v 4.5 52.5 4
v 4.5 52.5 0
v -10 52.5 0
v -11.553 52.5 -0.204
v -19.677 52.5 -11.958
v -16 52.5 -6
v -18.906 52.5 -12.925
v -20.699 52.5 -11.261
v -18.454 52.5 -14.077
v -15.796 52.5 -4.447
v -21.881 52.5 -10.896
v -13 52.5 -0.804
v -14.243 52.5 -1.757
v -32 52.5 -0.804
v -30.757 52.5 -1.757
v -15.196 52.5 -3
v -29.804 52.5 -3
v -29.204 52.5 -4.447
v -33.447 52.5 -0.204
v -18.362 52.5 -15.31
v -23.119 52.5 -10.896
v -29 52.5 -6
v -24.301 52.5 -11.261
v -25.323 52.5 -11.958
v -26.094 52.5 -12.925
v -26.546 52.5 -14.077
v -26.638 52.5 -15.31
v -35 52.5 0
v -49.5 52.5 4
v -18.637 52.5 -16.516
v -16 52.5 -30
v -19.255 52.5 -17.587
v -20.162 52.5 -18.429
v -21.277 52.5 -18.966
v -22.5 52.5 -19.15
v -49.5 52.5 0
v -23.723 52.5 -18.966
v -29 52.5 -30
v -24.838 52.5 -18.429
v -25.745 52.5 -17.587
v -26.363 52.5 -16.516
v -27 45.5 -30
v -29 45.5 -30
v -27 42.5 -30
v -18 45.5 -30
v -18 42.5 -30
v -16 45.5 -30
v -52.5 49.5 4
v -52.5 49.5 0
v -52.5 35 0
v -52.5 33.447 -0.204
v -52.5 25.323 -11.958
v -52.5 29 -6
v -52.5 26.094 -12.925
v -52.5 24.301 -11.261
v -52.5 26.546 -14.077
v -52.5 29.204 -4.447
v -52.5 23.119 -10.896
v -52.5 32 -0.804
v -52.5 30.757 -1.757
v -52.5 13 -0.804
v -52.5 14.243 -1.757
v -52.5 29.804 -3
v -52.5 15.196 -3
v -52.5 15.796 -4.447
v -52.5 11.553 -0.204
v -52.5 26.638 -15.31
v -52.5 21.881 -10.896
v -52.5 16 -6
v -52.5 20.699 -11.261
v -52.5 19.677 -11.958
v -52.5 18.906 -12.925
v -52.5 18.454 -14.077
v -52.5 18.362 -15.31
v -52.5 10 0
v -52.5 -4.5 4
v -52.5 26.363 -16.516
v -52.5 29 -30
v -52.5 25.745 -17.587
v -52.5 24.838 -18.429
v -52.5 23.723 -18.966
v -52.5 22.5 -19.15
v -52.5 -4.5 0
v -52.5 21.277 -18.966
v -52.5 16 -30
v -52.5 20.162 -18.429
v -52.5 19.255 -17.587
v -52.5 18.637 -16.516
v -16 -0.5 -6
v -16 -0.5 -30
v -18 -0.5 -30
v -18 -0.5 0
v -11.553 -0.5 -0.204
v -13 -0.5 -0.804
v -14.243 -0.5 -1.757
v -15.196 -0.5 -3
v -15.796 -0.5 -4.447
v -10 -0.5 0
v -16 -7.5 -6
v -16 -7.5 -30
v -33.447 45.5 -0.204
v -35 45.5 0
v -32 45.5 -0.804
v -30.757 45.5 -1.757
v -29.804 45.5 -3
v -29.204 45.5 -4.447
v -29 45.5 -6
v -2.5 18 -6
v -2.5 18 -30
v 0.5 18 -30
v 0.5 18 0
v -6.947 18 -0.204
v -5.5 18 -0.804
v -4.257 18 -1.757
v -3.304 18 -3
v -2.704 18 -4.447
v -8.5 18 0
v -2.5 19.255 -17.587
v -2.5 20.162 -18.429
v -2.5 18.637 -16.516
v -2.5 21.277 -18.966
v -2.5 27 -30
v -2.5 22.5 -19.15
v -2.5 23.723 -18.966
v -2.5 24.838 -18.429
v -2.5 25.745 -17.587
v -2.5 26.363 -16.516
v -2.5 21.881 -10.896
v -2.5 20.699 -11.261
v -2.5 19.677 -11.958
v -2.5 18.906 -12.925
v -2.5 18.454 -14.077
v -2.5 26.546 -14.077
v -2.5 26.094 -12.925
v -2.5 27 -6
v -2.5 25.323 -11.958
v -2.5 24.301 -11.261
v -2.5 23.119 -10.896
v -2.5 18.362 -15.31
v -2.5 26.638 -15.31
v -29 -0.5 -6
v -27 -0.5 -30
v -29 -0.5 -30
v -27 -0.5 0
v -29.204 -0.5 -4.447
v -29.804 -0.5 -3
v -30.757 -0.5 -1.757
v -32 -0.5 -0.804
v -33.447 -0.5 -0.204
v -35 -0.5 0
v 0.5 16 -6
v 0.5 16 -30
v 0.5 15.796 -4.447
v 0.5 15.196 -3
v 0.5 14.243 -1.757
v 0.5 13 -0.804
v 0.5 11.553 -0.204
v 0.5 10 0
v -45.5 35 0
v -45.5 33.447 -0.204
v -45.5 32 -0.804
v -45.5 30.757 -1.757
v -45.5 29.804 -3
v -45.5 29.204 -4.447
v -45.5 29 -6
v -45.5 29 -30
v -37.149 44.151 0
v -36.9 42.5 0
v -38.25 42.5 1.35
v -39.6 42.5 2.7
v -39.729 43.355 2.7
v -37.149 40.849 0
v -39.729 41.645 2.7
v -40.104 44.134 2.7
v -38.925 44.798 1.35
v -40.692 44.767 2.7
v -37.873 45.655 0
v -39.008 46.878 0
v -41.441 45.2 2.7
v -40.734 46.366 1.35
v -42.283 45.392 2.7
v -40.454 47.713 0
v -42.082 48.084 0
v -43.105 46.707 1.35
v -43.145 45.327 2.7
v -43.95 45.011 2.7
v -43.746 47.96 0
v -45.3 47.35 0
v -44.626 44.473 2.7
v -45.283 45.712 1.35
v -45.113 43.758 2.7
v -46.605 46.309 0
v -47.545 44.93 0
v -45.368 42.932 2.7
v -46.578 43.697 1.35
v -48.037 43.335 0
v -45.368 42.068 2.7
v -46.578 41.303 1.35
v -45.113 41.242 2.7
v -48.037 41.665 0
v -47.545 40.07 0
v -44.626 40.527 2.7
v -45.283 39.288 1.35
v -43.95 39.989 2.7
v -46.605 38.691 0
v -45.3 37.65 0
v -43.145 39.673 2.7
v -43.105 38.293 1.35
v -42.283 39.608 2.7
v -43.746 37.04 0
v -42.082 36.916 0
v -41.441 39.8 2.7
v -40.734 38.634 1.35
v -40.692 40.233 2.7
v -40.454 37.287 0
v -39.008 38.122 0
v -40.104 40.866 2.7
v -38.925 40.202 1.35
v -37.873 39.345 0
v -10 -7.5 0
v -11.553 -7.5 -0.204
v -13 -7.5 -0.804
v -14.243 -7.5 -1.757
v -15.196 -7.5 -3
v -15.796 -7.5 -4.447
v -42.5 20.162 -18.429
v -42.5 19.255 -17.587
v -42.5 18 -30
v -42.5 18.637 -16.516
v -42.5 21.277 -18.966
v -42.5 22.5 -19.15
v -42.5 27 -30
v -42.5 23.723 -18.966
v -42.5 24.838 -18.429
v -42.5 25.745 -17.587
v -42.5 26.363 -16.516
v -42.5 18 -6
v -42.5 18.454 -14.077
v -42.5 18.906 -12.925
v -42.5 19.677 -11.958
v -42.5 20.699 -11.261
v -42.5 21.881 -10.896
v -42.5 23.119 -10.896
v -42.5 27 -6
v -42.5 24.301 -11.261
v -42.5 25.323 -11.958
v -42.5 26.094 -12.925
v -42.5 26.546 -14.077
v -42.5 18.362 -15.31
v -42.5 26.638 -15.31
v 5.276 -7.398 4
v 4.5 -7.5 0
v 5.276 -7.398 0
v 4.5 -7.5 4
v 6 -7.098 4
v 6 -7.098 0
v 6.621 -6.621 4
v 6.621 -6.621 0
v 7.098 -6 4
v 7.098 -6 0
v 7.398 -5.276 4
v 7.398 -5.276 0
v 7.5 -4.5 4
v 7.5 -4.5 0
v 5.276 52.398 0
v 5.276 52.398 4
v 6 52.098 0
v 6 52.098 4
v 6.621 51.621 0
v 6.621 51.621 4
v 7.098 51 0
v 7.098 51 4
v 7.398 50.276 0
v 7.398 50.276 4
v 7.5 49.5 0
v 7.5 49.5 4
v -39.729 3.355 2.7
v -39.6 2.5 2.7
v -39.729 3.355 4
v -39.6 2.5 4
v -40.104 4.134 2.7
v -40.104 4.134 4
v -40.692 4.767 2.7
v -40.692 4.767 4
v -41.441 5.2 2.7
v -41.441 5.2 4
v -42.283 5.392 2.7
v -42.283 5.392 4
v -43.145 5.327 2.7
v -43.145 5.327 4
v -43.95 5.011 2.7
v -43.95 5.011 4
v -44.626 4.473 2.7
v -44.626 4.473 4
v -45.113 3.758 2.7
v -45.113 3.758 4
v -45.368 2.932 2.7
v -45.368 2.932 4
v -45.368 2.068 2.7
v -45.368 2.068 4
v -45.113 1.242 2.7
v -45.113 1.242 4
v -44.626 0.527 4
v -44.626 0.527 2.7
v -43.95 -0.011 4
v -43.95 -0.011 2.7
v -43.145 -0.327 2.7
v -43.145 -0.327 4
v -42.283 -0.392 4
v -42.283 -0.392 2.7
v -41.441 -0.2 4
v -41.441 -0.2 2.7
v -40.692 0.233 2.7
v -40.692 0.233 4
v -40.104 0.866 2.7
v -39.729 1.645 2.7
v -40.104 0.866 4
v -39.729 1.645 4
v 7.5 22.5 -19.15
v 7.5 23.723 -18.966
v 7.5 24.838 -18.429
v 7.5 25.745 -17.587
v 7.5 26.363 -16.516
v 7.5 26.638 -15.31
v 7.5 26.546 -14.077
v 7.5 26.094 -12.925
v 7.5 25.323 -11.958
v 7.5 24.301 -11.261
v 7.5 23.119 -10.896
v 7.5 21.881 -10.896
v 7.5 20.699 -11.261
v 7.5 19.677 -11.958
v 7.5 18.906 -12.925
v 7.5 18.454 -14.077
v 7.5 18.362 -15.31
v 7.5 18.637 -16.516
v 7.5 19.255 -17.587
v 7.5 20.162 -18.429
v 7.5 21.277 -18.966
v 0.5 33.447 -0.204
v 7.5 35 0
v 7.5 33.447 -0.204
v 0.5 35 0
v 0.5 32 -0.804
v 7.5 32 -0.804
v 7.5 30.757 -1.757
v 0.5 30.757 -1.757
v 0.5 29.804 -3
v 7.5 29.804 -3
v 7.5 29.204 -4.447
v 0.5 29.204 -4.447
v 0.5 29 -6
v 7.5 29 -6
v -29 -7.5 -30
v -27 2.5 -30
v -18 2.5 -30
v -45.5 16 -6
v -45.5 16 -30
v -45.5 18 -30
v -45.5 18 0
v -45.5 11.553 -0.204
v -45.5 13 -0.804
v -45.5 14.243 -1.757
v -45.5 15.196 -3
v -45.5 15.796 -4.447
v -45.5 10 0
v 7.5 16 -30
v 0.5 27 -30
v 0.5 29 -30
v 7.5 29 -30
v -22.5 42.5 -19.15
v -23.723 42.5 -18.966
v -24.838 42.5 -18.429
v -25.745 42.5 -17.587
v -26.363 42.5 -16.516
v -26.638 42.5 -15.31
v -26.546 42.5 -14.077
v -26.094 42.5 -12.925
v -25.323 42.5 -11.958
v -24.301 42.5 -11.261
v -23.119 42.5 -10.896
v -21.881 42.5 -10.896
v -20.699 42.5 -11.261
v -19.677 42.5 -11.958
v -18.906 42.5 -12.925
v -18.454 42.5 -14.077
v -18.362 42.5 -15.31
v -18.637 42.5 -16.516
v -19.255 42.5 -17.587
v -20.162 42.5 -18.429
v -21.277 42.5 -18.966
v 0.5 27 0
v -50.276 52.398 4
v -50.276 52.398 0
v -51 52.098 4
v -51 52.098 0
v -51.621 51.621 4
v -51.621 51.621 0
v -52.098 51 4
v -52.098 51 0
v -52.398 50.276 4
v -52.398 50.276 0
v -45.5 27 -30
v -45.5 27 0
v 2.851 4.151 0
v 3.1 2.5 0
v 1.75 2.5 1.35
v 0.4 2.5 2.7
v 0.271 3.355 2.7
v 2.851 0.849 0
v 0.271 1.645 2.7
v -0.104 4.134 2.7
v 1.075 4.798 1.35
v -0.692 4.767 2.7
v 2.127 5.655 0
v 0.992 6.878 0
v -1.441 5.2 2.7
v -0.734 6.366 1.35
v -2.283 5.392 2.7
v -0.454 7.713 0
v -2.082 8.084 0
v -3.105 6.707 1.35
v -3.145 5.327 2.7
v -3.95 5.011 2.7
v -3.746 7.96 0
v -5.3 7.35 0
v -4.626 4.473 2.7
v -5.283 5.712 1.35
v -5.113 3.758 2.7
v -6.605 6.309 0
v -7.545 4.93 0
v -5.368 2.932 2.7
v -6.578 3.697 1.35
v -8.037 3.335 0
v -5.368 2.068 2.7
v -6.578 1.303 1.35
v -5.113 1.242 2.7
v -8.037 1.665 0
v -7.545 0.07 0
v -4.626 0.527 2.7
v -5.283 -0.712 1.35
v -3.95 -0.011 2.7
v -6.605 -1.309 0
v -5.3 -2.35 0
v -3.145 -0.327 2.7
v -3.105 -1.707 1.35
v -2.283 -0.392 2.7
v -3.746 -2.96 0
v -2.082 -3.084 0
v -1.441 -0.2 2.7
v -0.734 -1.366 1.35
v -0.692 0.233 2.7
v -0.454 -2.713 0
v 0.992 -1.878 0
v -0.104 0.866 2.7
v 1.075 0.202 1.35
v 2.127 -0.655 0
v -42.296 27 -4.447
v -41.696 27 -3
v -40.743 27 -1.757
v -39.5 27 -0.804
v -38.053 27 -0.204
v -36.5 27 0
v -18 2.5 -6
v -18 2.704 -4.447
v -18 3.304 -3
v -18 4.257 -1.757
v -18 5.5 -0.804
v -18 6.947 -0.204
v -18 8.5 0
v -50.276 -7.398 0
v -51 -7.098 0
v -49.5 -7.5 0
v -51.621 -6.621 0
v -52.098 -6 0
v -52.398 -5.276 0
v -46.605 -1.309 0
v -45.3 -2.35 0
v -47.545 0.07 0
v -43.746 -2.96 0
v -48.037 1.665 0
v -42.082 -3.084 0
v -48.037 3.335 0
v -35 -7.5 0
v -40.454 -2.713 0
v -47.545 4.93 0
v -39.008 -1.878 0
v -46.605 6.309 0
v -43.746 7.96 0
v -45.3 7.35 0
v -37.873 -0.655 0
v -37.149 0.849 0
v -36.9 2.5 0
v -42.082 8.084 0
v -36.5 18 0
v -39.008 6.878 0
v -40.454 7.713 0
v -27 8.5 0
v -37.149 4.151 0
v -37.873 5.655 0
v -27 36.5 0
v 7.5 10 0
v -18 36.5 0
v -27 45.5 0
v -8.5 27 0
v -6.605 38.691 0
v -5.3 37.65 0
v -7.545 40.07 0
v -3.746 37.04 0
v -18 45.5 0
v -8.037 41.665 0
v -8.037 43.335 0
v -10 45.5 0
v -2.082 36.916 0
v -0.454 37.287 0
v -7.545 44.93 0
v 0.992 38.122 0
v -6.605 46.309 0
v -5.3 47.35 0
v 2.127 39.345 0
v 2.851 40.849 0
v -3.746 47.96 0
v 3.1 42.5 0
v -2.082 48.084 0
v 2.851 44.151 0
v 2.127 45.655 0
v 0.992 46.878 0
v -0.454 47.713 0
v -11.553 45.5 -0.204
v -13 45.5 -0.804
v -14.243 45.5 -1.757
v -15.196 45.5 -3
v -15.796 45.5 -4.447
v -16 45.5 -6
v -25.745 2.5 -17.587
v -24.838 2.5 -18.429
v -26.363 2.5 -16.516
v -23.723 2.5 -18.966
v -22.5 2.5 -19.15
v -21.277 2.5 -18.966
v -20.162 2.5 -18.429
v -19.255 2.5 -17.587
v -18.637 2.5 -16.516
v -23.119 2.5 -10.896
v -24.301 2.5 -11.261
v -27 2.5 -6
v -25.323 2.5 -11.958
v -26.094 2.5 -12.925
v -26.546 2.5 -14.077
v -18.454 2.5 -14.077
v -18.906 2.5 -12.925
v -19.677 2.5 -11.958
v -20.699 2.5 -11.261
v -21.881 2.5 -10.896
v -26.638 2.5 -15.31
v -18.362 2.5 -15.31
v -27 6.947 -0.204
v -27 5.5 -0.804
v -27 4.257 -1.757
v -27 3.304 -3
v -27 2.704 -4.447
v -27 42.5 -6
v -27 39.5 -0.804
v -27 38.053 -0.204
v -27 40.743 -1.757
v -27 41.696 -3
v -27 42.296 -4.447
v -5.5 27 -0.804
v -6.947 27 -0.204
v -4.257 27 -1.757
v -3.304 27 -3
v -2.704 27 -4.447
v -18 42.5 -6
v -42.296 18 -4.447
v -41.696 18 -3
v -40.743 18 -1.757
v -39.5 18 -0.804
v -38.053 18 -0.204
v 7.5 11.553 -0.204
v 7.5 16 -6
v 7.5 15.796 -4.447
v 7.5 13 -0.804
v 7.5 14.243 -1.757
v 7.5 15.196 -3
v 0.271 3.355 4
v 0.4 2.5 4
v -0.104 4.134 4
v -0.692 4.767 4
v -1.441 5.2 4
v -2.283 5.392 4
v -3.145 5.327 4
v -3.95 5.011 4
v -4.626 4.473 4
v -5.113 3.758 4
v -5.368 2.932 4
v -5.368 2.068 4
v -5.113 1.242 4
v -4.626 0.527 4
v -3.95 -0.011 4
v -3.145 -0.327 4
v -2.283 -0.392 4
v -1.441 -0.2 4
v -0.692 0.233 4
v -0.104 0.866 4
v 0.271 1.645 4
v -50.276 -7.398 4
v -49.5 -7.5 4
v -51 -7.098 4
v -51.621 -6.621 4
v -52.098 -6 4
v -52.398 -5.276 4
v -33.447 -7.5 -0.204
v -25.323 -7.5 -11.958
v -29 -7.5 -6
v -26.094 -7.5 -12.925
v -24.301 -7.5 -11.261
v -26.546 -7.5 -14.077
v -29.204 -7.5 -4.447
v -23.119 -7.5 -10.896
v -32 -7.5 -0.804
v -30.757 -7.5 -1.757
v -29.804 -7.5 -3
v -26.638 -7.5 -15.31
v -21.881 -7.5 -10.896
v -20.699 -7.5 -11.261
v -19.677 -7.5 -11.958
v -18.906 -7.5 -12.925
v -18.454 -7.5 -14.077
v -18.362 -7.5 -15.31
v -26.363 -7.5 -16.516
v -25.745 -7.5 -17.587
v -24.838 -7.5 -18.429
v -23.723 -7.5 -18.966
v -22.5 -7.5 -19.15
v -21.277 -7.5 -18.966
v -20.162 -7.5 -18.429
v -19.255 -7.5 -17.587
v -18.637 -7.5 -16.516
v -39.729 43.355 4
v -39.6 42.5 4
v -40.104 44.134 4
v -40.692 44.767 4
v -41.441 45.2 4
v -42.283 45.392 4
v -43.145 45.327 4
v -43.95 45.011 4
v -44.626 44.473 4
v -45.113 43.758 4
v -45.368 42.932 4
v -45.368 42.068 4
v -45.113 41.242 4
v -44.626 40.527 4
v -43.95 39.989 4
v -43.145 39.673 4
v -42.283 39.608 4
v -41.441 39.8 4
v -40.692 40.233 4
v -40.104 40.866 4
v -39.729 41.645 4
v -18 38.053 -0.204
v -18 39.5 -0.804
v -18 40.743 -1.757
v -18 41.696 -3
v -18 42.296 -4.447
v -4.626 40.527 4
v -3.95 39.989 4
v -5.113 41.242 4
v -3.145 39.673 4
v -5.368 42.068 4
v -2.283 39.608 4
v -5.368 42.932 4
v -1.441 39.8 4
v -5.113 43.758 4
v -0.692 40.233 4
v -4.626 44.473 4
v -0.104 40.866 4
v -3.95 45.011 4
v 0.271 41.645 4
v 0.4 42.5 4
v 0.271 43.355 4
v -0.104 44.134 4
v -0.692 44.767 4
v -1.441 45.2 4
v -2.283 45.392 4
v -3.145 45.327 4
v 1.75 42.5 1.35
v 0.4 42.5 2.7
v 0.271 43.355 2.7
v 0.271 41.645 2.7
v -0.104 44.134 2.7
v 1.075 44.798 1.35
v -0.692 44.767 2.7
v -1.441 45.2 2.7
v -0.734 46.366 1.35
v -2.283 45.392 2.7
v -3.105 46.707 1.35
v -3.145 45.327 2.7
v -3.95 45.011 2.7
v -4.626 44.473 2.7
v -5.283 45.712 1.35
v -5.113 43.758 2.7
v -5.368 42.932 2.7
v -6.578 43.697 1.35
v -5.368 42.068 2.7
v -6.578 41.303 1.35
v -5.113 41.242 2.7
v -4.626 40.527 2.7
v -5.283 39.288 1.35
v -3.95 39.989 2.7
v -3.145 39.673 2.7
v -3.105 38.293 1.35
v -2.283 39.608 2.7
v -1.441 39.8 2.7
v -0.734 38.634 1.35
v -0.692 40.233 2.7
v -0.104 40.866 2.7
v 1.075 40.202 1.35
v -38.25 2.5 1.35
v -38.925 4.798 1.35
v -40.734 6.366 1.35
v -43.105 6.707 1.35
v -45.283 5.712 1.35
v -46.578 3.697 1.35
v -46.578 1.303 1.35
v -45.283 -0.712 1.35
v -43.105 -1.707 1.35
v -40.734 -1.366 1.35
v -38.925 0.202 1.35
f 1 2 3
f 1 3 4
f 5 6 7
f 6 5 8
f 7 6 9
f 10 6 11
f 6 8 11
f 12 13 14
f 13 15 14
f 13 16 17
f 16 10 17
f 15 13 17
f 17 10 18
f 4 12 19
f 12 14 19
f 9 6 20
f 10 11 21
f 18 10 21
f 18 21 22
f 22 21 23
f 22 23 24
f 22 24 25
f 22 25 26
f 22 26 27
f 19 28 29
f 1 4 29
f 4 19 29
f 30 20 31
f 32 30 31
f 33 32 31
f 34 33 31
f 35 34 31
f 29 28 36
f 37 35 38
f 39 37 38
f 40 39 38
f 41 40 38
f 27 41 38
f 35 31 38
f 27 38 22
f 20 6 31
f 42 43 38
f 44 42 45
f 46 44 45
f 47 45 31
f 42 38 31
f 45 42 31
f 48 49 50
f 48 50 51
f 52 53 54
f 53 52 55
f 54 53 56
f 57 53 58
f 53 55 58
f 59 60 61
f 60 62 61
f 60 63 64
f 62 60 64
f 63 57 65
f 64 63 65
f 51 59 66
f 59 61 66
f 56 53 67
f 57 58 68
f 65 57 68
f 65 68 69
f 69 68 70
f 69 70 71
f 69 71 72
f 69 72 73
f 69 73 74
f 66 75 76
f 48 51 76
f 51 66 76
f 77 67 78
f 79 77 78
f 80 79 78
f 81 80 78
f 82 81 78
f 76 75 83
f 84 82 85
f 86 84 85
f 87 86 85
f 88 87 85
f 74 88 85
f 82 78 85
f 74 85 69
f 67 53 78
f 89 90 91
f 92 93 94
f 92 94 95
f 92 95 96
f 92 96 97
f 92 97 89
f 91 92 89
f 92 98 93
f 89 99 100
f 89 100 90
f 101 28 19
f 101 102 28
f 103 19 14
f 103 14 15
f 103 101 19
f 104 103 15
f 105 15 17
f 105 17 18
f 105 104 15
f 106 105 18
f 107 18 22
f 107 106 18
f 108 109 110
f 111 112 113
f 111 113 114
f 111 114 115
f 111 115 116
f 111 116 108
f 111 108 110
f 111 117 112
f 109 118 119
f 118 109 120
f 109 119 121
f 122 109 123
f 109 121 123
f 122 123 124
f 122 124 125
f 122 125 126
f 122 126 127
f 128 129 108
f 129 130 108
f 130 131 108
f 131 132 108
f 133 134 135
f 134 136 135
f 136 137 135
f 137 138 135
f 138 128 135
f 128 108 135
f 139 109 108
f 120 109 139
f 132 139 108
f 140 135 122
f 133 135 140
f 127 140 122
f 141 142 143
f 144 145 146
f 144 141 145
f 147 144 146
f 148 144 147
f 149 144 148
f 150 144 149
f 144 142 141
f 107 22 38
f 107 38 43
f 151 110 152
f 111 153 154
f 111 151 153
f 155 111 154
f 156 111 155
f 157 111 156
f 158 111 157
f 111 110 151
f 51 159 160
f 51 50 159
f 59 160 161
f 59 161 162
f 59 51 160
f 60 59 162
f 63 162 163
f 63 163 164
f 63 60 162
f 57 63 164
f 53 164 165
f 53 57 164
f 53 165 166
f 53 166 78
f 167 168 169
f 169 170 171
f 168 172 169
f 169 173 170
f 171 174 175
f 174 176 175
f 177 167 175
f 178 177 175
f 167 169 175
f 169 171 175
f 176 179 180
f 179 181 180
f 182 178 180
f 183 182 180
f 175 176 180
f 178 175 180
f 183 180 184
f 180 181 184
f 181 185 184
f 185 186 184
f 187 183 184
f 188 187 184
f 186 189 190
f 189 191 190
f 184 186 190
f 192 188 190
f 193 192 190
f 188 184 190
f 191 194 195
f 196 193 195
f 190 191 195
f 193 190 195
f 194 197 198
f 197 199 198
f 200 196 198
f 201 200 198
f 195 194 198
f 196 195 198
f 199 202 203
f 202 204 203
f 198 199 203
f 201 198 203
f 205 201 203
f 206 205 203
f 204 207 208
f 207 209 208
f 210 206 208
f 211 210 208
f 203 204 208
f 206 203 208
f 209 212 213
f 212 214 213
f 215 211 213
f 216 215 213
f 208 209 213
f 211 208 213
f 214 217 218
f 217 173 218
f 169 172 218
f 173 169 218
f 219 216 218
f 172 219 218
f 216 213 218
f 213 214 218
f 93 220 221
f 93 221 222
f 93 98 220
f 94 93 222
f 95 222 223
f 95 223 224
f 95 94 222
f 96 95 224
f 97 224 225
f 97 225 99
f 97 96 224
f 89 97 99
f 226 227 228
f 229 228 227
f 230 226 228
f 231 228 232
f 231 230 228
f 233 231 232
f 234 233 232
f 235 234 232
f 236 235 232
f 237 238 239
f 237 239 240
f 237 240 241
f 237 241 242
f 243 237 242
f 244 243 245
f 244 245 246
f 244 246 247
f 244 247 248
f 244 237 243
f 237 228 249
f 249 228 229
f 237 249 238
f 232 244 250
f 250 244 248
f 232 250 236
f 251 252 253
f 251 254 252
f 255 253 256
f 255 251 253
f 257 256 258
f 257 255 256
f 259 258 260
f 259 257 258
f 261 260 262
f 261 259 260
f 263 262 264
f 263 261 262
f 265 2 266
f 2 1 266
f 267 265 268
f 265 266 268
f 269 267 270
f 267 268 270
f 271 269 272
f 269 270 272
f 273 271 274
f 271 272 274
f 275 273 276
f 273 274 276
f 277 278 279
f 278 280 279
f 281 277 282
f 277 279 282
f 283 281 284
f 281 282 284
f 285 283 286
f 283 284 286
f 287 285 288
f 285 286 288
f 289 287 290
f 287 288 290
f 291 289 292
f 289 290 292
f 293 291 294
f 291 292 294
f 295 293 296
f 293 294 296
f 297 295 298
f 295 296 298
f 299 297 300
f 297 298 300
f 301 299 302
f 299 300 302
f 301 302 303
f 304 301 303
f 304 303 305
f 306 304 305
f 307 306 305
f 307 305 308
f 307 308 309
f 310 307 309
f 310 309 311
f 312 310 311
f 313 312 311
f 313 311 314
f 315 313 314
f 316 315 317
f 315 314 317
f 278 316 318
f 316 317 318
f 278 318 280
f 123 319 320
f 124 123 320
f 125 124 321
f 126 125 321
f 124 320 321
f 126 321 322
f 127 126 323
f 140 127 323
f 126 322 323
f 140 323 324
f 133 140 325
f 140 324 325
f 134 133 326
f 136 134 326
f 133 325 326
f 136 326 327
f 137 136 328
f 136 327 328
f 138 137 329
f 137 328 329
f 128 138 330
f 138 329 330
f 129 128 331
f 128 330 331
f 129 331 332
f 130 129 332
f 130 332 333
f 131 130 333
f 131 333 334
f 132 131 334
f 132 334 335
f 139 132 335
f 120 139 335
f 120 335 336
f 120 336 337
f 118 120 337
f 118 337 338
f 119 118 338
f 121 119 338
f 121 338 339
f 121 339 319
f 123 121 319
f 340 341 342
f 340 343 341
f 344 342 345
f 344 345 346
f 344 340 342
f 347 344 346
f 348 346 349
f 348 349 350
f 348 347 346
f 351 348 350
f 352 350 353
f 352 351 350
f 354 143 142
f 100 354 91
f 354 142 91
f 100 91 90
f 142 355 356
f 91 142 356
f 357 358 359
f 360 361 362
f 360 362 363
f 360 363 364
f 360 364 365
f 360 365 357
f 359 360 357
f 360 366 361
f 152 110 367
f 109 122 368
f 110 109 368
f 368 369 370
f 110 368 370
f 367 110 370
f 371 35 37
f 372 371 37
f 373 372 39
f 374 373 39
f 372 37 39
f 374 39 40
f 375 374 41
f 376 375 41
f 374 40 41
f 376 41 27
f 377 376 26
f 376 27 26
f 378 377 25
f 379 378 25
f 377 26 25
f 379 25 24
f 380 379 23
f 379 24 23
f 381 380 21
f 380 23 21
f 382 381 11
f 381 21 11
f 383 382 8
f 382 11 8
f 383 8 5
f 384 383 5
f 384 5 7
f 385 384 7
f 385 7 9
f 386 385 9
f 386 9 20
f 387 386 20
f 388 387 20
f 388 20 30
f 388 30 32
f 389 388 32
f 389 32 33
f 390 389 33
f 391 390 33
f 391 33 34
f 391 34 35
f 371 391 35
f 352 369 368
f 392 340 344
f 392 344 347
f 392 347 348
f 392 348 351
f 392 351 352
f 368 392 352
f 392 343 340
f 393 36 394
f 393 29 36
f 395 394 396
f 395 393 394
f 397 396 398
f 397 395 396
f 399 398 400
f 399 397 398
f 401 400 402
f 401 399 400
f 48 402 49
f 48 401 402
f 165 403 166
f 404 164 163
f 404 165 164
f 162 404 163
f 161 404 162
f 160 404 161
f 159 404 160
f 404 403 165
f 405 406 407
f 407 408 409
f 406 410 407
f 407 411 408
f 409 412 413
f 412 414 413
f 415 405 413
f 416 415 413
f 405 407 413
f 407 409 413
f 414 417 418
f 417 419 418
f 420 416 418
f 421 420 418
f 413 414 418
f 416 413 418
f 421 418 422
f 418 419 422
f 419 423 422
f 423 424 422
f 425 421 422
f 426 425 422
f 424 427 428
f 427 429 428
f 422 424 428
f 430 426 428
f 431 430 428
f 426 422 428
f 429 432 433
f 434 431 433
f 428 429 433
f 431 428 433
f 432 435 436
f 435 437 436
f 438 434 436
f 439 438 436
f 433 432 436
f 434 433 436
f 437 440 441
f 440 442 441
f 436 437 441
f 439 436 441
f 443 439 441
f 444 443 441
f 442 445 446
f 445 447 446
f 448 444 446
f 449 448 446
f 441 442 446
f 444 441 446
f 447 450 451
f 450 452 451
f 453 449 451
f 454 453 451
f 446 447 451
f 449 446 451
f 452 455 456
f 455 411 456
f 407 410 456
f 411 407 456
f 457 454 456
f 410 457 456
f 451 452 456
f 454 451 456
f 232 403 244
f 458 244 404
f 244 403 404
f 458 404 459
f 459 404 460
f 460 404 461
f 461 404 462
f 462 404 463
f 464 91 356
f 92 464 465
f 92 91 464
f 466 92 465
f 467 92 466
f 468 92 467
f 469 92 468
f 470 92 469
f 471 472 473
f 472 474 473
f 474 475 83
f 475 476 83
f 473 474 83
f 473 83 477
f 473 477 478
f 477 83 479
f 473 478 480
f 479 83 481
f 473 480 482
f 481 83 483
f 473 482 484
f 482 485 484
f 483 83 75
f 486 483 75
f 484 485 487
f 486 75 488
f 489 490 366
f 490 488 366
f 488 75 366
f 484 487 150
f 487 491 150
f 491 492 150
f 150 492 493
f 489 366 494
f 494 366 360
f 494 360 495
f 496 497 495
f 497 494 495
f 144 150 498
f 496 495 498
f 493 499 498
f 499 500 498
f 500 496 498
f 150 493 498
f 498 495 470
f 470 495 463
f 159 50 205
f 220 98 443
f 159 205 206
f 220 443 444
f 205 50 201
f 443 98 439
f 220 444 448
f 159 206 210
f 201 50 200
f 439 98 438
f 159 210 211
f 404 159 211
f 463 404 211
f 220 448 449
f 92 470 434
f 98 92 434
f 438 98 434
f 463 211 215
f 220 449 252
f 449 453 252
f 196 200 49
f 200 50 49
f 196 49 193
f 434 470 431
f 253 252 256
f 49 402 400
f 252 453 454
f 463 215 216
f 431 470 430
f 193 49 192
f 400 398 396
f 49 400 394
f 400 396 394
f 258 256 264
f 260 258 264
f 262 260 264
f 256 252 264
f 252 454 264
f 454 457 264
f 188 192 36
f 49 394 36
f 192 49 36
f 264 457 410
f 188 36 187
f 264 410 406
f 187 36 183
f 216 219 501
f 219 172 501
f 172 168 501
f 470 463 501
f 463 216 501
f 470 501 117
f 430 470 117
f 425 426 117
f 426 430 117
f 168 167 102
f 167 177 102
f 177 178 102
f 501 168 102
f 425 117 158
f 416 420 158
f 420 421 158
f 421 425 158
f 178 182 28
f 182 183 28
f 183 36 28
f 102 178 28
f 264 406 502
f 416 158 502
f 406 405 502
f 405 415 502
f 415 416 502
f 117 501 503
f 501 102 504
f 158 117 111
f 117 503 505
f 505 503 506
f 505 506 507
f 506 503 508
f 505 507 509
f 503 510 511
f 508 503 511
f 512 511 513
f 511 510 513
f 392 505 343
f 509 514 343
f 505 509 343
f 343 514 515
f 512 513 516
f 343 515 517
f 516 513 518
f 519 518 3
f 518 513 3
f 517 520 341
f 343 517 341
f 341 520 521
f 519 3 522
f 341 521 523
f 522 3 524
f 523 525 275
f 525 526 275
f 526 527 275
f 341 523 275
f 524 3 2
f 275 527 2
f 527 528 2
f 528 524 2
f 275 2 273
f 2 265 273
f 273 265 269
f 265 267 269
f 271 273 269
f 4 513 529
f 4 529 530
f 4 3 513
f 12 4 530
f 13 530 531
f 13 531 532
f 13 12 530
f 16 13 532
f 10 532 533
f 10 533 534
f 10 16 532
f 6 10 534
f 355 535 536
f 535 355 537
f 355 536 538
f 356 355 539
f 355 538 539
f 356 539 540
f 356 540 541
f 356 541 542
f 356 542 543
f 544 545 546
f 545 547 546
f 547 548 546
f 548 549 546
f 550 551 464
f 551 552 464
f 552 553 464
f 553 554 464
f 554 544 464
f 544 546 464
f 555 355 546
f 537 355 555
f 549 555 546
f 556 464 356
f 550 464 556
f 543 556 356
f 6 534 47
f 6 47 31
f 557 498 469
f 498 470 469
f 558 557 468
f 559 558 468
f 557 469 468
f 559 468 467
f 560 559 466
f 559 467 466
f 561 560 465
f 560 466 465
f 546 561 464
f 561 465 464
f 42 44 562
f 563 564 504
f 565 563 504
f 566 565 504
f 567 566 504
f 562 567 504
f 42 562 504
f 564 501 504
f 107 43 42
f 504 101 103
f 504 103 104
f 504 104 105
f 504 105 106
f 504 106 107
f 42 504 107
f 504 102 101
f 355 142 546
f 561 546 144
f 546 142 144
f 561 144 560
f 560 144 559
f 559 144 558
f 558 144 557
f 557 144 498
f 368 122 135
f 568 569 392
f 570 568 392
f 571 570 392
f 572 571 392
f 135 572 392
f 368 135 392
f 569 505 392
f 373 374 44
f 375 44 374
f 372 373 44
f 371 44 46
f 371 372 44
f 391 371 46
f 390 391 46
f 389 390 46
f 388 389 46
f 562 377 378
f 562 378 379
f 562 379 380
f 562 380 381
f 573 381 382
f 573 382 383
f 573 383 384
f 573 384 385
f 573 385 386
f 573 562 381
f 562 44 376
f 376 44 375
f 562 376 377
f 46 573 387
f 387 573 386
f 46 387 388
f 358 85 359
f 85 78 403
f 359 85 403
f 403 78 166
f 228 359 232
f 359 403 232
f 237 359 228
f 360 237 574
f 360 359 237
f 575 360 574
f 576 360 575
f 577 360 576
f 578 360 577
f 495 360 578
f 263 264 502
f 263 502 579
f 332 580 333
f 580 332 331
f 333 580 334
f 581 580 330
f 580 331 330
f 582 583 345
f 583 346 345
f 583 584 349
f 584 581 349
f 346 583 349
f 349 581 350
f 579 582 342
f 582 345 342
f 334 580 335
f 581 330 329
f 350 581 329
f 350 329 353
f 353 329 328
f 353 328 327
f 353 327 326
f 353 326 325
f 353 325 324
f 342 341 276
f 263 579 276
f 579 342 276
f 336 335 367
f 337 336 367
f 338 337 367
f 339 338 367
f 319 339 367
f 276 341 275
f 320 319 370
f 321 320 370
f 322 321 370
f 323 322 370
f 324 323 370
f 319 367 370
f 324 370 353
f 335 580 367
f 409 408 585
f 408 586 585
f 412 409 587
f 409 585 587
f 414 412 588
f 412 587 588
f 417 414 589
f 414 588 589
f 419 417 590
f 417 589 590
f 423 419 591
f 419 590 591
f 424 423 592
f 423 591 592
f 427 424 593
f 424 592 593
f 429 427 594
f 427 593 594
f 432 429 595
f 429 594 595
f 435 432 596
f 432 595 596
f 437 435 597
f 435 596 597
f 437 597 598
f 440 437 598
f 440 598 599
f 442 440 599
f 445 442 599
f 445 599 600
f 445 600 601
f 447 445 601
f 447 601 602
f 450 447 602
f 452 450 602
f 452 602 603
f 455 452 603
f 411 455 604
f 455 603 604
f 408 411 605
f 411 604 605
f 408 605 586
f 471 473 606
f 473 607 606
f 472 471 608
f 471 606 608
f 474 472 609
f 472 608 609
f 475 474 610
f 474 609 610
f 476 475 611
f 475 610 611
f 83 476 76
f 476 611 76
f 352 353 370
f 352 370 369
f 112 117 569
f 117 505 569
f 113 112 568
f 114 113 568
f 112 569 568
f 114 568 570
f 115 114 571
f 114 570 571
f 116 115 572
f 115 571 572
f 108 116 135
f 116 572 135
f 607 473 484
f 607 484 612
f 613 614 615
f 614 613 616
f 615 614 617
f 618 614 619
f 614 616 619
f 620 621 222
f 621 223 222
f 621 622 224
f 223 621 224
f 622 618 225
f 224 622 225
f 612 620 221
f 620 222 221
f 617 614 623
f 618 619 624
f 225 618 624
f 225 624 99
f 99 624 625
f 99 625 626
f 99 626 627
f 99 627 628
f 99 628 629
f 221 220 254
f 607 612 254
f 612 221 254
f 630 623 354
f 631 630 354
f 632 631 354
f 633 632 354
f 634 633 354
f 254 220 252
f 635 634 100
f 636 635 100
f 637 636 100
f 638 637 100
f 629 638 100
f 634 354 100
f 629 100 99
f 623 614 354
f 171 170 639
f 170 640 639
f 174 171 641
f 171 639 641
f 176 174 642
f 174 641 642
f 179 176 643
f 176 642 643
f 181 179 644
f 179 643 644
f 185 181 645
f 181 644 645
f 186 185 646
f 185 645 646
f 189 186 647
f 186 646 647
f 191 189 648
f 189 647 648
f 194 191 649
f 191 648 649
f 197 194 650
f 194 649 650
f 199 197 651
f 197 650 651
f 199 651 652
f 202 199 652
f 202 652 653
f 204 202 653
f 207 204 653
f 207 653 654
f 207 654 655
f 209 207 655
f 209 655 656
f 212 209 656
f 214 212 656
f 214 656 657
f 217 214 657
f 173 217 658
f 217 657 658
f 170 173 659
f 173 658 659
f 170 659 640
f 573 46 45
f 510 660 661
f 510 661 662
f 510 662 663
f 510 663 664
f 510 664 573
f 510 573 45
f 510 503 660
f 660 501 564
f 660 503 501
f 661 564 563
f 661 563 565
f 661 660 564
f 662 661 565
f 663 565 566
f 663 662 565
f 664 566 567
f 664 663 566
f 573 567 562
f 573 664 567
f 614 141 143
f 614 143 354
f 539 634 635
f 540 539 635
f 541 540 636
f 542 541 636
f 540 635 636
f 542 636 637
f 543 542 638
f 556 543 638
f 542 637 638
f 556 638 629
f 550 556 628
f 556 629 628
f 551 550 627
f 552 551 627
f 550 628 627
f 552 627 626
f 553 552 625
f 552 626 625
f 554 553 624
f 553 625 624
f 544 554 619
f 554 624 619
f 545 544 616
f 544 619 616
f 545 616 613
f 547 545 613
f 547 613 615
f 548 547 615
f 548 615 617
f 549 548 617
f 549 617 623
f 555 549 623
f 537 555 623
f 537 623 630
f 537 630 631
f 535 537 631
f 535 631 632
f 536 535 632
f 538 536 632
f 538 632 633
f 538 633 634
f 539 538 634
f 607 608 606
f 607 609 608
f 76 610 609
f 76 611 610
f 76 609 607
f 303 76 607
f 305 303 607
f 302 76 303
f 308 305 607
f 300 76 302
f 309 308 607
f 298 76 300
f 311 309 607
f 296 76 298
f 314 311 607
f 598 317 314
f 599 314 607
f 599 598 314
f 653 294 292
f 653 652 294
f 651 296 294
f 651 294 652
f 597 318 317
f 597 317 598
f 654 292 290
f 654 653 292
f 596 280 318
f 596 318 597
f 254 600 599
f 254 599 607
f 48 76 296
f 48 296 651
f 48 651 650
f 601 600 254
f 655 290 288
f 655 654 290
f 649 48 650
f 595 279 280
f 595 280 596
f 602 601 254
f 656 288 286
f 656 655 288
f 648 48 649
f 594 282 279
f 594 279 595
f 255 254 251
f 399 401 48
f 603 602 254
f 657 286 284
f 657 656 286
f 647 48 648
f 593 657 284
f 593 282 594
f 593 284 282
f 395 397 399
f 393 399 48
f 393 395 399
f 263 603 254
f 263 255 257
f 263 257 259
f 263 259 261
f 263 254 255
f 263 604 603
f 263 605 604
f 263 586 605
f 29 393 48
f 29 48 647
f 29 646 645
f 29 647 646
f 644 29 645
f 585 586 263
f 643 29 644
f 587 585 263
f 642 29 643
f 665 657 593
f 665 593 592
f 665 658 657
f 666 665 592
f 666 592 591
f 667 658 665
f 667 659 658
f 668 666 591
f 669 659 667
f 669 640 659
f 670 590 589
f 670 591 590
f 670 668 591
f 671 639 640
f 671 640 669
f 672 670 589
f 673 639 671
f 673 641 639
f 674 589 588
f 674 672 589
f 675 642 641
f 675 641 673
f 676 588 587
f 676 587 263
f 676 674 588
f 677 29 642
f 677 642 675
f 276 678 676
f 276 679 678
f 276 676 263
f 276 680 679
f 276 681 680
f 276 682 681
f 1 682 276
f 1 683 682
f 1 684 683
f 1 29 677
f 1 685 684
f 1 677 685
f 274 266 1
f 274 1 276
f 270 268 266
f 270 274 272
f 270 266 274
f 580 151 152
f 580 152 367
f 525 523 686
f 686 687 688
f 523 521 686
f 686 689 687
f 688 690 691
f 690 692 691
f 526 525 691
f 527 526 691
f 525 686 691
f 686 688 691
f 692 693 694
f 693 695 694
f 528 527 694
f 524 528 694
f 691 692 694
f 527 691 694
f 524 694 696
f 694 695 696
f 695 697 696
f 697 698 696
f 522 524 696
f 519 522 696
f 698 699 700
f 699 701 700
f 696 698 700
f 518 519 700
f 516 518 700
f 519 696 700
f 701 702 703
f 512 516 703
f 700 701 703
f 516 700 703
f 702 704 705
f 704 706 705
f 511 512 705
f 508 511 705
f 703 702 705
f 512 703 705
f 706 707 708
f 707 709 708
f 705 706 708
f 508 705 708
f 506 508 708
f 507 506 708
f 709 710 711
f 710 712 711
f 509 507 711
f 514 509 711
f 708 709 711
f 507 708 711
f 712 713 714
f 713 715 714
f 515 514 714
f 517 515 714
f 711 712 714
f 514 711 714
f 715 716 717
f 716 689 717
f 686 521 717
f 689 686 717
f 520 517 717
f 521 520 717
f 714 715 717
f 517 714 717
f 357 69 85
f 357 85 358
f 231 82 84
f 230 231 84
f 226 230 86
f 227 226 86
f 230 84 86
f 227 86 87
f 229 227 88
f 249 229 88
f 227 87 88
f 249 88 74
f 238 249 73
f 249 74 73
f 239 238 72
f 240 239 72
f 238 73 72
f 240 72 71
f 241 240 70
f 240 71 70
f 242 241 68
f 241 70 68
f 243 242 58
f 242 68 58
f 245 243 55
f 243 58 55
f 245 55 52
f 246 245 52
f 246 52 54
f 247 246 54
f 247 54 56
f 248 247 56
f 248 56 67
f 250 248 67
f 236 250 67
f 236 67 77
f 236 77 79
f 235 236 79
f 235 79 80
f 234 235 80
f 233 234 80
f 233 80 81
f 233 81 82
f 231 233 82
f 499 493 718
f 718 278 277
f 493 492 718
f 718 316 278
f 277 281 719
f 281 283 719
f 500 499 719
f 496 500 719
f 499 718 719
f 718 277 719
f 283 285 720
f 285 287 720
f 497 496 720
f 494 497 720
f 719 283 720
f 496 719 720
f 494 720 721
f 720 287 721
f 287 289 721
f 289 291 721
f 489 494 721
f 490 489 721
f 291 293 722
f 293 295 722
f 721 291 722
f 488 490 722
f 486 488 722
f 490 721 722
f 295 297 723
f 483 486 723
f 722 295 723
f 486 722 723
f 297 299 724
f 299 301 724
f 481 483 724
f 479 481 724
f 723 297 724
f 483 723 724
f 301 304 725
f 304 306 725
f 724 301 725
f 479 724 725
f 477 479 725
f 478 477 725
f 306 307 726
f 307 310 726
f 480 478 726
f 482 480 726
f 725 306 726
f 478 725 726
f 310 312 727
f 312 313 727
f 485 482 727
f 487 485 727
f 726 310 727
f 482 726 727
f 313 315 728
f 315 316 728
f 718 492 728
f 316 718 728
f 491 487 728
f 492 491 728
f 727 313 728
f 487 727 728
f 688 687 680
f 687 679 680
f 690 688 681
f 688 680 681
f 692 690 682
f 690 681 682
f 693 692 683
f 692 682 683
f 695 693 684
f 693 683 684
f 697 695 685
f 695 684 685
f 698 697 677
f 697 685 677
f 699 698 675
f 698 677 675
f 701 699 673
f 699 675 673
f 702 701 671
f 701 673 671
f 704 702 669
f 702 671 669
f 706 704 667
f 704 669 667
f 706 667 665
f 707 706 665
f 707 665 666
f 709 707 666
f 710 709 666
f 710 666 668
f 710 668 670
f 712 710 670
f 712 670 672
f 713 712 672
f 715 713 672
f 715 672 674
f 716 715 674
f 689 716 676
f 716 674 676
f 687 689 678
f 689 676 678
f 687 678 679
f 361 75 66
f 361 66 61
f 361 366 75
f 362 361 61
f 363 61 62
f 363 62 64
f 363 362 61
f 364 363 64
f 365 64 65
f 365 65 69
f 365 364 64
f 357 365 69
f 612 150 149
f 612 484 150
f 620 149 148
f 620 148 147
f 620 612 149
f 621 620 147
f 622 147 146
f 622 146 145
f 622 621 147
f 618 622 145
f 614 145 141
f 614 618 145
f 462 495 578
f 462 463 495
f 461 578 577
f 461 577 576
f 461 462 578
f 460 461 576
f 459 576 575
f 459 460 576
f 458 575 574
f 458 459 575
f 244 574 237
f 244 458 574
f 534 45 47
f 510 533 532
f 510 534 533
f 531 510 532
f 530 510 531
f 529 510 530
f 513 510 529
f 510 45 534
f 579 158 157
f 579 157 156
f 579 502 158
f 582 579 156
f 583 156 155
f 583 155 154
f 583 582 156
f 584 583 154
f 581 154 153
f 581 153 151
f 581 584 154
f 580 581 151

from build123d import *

# Parameters (mm, degrees)
SKETCH1_W                                            = 60
SKETCH1_H                                            = 60
BOSS_EXTRUDE1_DEPTH                                  = 4
BOSS_EXTRUDE2_DEPTH                                  = 30
CSK_FOR_M5_HEX_SOCKET_COUNTERSUNK_CAP_SC_D           = 5.8
CSK_FOR_M5_HEX_SOCKET_COUNTERSUNK_CAP_SC_DEPTH       = 4
CSK_FOR_M5_HEX_SOCKET_COUNTERSUNK_CAP_SC_CSINK_D     = 11.2
CSK_FOR_M5_HEX_SOCKET_COUNTERSUNK_CAP_SC_CSINK_ANGLE = 90
CSK_FOR_M5_HEX_SOCKET_COUNTERSUNK_CAP_SC_TIP         = 1.742495795
FILLET1_R                                            = 3
FILLET2_R                                            = 6
CUT_EXTRUDE1_REACH                                   = 87.184
SKETCH8_R                                            = 4.15
CIRPATTERN1_COUNT                                    = 4


with BuildPart() as part:
    # Sketch1 → Boss-Extrude1 (new body)
    with BuildSketch(Plane.XY):
        with Locations((-22.5, 22.5)):
            Rectangle(SKETCH1_W, SKETCH1_H)
    extrude(amount=BOSS_EXTRUDE1_DEPTH)

    # Sketch1<3> → Boss-Extrude2 (add)
    with BuildSketch(Plane.XY):
        Polygon((-29, -0.5), (-29, -7.5), (-16, -7.5), (-16, -0.5), (-18, -0.5), (-18, 2.5), (-27, 2.5), (-27, -0.5), align=None)
        Polygon((-52.5, 29), (-52.5, 16), (-45.5, 16), (-45.5, 18), (-42.5, 18), (-42.5, 27), (-45.5, 27), (-45.5, 29), align=None)
        Polygon((0.5, 16), (7.5, 16), (7.5, 29), (0.5, 29), (0.5, 27), (-2.5, 27), (-2.5, 18), (0.5, 18), align=None)
        Polygon((-16, 52.5), (-29, 52.5), (-29, 45.5), (-27, 45.5), (-27, 42.5), (-18, 42.5), (-18, 45.5), (-16, 45.5), align=None)
    extrude(amount=-BOSS_EXTRUDE2_DEPTH)

    # CSK for M5 Hex Socket Countersunk Cap Screw1
    with Locations(Plane(origin=(0, 0, 0), x_dir=(-1, 0, 0), z_dir=(0, 0, -1))):
        with Locations((2.5, 42.5), (42.5, 42.5), (42.5, 2.5), (2.5, 2.5)):
            CounterSinkHole(CSK_FOR_M5_HEX_SOCKET_COUNTERSUNK_CAP_SC_D / 2, CSK_FOR_M5_HEX_SOCKET_COUNTERSUNK_CAP_SC_CSINK_D / 2, depth=CSK_FOR_M5_HEX_SOCKET_COUNTERSUNK_CAP_SC_DEPTH, counter_sink_angle=CSK_FOR_M5_HEX_SOCKET_COUNTERSUNK_CAP_SC_CSINK_ANGLE)
            with Locations((0, 0, -(CSK_FOR_M5_HEX_SOCKET_COUNTERSUNK_CAP_SC_DEPTH + CSK_FOR_M5_HEX_SOCKET_COUNTERSUNK_CAP_SC_TIP / 2))):  # 118° drill point
                Cone(0, CSK_FOR_M5_HEX_SOCKET_COUNTERSUNK_CAP_SC_D / 2, CSK_FOR_M5_HEX_SOCKET_COUNTERSUNK_CAP_SC_TIP, mode=Mode.SUBTRACT)

    # Fillet1
    fillet1_edges = [part.edges().sort_by_distance(p)[0] for p in [
        (-52.5, -7.5, 2),
        (7.5, -7.5, 2),
        (-52.5, 52.5, 2),
        (7.5, 52.5, 2),
    ]]
    fillet(fillet1_edges, radius=FILLET1_R)

    # Fillet2
    fillet2_edges = [part.edges().sort_by_distance(p)[0] for p in [
        (4, 16, 0),
        (4, 29, 0),
        (-16, 49, 0),
        (-29, 49, 0),
        (-49, 29, 0),
        (-49, 16, 0),
        (-29, -4, 0),
        (-16, -4, 0),
        (-22.5, 2.5, 0),
        (-42.5, 22.5, 0),
        (-22.5, 42.5, 0),
        (-2.5, 22.5, 0),
    ]]
    fillet(fillet2_edges, radius=FILLET2_R)

    # Sketch8 → Cut-Extrude1 (cut, up to next)
    with BuildSketch(Plane(origin=(7.5, 0, 0), x_dir=(0, 0, -1), z_dir=(1, 0, 0)), mode=Mode.PRIVATE) as cut_extrude1_sk1:
        with Locations((15, 22.5)):
            Circle(SKETCH8_R)
    cut_extrude1_tool1 = extrude(cut_extrude1_sk1.sketch, amount=-CUT_EXTRUDE1_REACH, mode=Mode.PRIVATE) & part.part
    cut_extrude1 = cut_extrude1_tool1.solids().sort_by_distance((7.5, 22.5, -15))[0]
    add(cut_extrude1, mode=Mode.SUBTRACT)

    # CirPattern1: Cut-Extrude1 ×4 about axis
    cirpattern1_axis = Axis((-22.5, 22.5, 0), (0, 0, -1))
    for i in range(1, CIRPATTERN1_COUNT):
        add(cut_extrude1.rotate(cirpattern1_axis, i * 360 / CIRPATTERN1_COUNT), mode=Mode.SUBTRACT)


solid = part.part
